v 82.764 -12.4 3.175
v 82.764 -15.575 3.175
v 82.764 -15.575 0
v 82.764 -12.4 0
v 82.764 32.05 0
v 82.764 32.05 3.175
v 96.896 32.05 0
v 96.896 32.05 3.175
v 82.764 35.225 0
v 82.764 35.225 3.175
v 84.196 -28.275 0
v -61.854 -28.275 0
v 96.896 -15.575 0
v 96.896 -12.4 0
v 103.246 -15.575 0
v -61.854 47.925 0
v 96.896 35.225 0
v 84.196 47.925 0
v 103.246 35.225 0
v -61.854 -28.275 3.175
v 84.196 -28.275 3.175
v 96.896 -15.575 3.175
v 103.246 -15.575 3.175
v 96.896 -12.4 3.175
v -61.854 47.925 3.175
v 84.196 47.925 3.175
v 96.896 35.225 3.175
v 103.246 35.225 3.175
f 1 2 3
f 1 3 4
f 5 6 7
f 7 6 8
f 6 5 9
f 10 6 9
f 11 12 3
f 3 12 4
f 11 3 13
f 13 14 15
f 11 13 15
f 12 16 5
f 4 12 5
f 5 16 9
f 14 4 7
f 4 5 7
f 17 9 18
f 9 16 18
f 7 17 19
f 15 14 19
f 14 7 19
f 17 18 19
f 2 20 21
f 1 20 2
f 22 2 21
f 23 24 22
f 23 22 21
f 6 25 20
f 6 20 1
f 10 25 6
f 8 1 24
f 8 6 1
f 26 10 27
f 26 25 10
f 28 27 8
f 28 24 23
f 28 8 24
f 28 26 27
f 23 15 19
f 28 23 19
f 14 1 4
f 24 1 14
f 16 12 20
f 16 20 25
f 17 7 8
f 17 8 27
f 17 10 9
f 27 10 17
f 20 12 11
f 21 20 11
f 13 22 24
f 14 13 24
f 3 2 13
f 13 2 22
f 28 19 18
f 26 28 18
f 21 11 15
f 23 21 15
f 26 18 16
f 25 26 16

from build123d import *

# Parameters (mm, degrees)
F0_W     = 127
F0_H     = 76.2
F1_DEPTH = 3.175
F2_W     = 14.131395125
F2_H     = 3.175
F3_DEPTH = 25.4


# Not quite as in the source:
# - a length typed as a fraction of an inch, garbled in the dataset ("3 / 203.2 mm" for 3/8 in), is restored


with BuildPart() as f1:
    # F0 (on Top) → F1 (new body)
    with BuildSketch(Plane.XY):
        Polygon((84.1955885406, 47.9249996081), (65.1455885406, 47.9249996081), (65.1455885406, -28.2750003919), (84.1955885406, -28.2750003919), (103.2455885406, -15.5750003919), (103.2455885406, 35.2249996081), align=None)
        with Locations((1.6455885406, 9.8249996081)):
            Rectangle(F0_W, F0_H)
    extrude(amount=F1_DEPTH)

    # F2 (on face) → F3 (cut)
    with BuildSketch(Plane.XY.offset(3.175)):
        with Locations((89.8298909781, 33.6374996081)):
            Rectangle(F2_W, F2_H)
        with Locations((89.8298909781, -13.9875003919)):
            Rectangle(F2_W, F2_H)
    extrude(amount=-F3_DEPTH, mode=Mode.SUBTRACT)


solid = f1.part
